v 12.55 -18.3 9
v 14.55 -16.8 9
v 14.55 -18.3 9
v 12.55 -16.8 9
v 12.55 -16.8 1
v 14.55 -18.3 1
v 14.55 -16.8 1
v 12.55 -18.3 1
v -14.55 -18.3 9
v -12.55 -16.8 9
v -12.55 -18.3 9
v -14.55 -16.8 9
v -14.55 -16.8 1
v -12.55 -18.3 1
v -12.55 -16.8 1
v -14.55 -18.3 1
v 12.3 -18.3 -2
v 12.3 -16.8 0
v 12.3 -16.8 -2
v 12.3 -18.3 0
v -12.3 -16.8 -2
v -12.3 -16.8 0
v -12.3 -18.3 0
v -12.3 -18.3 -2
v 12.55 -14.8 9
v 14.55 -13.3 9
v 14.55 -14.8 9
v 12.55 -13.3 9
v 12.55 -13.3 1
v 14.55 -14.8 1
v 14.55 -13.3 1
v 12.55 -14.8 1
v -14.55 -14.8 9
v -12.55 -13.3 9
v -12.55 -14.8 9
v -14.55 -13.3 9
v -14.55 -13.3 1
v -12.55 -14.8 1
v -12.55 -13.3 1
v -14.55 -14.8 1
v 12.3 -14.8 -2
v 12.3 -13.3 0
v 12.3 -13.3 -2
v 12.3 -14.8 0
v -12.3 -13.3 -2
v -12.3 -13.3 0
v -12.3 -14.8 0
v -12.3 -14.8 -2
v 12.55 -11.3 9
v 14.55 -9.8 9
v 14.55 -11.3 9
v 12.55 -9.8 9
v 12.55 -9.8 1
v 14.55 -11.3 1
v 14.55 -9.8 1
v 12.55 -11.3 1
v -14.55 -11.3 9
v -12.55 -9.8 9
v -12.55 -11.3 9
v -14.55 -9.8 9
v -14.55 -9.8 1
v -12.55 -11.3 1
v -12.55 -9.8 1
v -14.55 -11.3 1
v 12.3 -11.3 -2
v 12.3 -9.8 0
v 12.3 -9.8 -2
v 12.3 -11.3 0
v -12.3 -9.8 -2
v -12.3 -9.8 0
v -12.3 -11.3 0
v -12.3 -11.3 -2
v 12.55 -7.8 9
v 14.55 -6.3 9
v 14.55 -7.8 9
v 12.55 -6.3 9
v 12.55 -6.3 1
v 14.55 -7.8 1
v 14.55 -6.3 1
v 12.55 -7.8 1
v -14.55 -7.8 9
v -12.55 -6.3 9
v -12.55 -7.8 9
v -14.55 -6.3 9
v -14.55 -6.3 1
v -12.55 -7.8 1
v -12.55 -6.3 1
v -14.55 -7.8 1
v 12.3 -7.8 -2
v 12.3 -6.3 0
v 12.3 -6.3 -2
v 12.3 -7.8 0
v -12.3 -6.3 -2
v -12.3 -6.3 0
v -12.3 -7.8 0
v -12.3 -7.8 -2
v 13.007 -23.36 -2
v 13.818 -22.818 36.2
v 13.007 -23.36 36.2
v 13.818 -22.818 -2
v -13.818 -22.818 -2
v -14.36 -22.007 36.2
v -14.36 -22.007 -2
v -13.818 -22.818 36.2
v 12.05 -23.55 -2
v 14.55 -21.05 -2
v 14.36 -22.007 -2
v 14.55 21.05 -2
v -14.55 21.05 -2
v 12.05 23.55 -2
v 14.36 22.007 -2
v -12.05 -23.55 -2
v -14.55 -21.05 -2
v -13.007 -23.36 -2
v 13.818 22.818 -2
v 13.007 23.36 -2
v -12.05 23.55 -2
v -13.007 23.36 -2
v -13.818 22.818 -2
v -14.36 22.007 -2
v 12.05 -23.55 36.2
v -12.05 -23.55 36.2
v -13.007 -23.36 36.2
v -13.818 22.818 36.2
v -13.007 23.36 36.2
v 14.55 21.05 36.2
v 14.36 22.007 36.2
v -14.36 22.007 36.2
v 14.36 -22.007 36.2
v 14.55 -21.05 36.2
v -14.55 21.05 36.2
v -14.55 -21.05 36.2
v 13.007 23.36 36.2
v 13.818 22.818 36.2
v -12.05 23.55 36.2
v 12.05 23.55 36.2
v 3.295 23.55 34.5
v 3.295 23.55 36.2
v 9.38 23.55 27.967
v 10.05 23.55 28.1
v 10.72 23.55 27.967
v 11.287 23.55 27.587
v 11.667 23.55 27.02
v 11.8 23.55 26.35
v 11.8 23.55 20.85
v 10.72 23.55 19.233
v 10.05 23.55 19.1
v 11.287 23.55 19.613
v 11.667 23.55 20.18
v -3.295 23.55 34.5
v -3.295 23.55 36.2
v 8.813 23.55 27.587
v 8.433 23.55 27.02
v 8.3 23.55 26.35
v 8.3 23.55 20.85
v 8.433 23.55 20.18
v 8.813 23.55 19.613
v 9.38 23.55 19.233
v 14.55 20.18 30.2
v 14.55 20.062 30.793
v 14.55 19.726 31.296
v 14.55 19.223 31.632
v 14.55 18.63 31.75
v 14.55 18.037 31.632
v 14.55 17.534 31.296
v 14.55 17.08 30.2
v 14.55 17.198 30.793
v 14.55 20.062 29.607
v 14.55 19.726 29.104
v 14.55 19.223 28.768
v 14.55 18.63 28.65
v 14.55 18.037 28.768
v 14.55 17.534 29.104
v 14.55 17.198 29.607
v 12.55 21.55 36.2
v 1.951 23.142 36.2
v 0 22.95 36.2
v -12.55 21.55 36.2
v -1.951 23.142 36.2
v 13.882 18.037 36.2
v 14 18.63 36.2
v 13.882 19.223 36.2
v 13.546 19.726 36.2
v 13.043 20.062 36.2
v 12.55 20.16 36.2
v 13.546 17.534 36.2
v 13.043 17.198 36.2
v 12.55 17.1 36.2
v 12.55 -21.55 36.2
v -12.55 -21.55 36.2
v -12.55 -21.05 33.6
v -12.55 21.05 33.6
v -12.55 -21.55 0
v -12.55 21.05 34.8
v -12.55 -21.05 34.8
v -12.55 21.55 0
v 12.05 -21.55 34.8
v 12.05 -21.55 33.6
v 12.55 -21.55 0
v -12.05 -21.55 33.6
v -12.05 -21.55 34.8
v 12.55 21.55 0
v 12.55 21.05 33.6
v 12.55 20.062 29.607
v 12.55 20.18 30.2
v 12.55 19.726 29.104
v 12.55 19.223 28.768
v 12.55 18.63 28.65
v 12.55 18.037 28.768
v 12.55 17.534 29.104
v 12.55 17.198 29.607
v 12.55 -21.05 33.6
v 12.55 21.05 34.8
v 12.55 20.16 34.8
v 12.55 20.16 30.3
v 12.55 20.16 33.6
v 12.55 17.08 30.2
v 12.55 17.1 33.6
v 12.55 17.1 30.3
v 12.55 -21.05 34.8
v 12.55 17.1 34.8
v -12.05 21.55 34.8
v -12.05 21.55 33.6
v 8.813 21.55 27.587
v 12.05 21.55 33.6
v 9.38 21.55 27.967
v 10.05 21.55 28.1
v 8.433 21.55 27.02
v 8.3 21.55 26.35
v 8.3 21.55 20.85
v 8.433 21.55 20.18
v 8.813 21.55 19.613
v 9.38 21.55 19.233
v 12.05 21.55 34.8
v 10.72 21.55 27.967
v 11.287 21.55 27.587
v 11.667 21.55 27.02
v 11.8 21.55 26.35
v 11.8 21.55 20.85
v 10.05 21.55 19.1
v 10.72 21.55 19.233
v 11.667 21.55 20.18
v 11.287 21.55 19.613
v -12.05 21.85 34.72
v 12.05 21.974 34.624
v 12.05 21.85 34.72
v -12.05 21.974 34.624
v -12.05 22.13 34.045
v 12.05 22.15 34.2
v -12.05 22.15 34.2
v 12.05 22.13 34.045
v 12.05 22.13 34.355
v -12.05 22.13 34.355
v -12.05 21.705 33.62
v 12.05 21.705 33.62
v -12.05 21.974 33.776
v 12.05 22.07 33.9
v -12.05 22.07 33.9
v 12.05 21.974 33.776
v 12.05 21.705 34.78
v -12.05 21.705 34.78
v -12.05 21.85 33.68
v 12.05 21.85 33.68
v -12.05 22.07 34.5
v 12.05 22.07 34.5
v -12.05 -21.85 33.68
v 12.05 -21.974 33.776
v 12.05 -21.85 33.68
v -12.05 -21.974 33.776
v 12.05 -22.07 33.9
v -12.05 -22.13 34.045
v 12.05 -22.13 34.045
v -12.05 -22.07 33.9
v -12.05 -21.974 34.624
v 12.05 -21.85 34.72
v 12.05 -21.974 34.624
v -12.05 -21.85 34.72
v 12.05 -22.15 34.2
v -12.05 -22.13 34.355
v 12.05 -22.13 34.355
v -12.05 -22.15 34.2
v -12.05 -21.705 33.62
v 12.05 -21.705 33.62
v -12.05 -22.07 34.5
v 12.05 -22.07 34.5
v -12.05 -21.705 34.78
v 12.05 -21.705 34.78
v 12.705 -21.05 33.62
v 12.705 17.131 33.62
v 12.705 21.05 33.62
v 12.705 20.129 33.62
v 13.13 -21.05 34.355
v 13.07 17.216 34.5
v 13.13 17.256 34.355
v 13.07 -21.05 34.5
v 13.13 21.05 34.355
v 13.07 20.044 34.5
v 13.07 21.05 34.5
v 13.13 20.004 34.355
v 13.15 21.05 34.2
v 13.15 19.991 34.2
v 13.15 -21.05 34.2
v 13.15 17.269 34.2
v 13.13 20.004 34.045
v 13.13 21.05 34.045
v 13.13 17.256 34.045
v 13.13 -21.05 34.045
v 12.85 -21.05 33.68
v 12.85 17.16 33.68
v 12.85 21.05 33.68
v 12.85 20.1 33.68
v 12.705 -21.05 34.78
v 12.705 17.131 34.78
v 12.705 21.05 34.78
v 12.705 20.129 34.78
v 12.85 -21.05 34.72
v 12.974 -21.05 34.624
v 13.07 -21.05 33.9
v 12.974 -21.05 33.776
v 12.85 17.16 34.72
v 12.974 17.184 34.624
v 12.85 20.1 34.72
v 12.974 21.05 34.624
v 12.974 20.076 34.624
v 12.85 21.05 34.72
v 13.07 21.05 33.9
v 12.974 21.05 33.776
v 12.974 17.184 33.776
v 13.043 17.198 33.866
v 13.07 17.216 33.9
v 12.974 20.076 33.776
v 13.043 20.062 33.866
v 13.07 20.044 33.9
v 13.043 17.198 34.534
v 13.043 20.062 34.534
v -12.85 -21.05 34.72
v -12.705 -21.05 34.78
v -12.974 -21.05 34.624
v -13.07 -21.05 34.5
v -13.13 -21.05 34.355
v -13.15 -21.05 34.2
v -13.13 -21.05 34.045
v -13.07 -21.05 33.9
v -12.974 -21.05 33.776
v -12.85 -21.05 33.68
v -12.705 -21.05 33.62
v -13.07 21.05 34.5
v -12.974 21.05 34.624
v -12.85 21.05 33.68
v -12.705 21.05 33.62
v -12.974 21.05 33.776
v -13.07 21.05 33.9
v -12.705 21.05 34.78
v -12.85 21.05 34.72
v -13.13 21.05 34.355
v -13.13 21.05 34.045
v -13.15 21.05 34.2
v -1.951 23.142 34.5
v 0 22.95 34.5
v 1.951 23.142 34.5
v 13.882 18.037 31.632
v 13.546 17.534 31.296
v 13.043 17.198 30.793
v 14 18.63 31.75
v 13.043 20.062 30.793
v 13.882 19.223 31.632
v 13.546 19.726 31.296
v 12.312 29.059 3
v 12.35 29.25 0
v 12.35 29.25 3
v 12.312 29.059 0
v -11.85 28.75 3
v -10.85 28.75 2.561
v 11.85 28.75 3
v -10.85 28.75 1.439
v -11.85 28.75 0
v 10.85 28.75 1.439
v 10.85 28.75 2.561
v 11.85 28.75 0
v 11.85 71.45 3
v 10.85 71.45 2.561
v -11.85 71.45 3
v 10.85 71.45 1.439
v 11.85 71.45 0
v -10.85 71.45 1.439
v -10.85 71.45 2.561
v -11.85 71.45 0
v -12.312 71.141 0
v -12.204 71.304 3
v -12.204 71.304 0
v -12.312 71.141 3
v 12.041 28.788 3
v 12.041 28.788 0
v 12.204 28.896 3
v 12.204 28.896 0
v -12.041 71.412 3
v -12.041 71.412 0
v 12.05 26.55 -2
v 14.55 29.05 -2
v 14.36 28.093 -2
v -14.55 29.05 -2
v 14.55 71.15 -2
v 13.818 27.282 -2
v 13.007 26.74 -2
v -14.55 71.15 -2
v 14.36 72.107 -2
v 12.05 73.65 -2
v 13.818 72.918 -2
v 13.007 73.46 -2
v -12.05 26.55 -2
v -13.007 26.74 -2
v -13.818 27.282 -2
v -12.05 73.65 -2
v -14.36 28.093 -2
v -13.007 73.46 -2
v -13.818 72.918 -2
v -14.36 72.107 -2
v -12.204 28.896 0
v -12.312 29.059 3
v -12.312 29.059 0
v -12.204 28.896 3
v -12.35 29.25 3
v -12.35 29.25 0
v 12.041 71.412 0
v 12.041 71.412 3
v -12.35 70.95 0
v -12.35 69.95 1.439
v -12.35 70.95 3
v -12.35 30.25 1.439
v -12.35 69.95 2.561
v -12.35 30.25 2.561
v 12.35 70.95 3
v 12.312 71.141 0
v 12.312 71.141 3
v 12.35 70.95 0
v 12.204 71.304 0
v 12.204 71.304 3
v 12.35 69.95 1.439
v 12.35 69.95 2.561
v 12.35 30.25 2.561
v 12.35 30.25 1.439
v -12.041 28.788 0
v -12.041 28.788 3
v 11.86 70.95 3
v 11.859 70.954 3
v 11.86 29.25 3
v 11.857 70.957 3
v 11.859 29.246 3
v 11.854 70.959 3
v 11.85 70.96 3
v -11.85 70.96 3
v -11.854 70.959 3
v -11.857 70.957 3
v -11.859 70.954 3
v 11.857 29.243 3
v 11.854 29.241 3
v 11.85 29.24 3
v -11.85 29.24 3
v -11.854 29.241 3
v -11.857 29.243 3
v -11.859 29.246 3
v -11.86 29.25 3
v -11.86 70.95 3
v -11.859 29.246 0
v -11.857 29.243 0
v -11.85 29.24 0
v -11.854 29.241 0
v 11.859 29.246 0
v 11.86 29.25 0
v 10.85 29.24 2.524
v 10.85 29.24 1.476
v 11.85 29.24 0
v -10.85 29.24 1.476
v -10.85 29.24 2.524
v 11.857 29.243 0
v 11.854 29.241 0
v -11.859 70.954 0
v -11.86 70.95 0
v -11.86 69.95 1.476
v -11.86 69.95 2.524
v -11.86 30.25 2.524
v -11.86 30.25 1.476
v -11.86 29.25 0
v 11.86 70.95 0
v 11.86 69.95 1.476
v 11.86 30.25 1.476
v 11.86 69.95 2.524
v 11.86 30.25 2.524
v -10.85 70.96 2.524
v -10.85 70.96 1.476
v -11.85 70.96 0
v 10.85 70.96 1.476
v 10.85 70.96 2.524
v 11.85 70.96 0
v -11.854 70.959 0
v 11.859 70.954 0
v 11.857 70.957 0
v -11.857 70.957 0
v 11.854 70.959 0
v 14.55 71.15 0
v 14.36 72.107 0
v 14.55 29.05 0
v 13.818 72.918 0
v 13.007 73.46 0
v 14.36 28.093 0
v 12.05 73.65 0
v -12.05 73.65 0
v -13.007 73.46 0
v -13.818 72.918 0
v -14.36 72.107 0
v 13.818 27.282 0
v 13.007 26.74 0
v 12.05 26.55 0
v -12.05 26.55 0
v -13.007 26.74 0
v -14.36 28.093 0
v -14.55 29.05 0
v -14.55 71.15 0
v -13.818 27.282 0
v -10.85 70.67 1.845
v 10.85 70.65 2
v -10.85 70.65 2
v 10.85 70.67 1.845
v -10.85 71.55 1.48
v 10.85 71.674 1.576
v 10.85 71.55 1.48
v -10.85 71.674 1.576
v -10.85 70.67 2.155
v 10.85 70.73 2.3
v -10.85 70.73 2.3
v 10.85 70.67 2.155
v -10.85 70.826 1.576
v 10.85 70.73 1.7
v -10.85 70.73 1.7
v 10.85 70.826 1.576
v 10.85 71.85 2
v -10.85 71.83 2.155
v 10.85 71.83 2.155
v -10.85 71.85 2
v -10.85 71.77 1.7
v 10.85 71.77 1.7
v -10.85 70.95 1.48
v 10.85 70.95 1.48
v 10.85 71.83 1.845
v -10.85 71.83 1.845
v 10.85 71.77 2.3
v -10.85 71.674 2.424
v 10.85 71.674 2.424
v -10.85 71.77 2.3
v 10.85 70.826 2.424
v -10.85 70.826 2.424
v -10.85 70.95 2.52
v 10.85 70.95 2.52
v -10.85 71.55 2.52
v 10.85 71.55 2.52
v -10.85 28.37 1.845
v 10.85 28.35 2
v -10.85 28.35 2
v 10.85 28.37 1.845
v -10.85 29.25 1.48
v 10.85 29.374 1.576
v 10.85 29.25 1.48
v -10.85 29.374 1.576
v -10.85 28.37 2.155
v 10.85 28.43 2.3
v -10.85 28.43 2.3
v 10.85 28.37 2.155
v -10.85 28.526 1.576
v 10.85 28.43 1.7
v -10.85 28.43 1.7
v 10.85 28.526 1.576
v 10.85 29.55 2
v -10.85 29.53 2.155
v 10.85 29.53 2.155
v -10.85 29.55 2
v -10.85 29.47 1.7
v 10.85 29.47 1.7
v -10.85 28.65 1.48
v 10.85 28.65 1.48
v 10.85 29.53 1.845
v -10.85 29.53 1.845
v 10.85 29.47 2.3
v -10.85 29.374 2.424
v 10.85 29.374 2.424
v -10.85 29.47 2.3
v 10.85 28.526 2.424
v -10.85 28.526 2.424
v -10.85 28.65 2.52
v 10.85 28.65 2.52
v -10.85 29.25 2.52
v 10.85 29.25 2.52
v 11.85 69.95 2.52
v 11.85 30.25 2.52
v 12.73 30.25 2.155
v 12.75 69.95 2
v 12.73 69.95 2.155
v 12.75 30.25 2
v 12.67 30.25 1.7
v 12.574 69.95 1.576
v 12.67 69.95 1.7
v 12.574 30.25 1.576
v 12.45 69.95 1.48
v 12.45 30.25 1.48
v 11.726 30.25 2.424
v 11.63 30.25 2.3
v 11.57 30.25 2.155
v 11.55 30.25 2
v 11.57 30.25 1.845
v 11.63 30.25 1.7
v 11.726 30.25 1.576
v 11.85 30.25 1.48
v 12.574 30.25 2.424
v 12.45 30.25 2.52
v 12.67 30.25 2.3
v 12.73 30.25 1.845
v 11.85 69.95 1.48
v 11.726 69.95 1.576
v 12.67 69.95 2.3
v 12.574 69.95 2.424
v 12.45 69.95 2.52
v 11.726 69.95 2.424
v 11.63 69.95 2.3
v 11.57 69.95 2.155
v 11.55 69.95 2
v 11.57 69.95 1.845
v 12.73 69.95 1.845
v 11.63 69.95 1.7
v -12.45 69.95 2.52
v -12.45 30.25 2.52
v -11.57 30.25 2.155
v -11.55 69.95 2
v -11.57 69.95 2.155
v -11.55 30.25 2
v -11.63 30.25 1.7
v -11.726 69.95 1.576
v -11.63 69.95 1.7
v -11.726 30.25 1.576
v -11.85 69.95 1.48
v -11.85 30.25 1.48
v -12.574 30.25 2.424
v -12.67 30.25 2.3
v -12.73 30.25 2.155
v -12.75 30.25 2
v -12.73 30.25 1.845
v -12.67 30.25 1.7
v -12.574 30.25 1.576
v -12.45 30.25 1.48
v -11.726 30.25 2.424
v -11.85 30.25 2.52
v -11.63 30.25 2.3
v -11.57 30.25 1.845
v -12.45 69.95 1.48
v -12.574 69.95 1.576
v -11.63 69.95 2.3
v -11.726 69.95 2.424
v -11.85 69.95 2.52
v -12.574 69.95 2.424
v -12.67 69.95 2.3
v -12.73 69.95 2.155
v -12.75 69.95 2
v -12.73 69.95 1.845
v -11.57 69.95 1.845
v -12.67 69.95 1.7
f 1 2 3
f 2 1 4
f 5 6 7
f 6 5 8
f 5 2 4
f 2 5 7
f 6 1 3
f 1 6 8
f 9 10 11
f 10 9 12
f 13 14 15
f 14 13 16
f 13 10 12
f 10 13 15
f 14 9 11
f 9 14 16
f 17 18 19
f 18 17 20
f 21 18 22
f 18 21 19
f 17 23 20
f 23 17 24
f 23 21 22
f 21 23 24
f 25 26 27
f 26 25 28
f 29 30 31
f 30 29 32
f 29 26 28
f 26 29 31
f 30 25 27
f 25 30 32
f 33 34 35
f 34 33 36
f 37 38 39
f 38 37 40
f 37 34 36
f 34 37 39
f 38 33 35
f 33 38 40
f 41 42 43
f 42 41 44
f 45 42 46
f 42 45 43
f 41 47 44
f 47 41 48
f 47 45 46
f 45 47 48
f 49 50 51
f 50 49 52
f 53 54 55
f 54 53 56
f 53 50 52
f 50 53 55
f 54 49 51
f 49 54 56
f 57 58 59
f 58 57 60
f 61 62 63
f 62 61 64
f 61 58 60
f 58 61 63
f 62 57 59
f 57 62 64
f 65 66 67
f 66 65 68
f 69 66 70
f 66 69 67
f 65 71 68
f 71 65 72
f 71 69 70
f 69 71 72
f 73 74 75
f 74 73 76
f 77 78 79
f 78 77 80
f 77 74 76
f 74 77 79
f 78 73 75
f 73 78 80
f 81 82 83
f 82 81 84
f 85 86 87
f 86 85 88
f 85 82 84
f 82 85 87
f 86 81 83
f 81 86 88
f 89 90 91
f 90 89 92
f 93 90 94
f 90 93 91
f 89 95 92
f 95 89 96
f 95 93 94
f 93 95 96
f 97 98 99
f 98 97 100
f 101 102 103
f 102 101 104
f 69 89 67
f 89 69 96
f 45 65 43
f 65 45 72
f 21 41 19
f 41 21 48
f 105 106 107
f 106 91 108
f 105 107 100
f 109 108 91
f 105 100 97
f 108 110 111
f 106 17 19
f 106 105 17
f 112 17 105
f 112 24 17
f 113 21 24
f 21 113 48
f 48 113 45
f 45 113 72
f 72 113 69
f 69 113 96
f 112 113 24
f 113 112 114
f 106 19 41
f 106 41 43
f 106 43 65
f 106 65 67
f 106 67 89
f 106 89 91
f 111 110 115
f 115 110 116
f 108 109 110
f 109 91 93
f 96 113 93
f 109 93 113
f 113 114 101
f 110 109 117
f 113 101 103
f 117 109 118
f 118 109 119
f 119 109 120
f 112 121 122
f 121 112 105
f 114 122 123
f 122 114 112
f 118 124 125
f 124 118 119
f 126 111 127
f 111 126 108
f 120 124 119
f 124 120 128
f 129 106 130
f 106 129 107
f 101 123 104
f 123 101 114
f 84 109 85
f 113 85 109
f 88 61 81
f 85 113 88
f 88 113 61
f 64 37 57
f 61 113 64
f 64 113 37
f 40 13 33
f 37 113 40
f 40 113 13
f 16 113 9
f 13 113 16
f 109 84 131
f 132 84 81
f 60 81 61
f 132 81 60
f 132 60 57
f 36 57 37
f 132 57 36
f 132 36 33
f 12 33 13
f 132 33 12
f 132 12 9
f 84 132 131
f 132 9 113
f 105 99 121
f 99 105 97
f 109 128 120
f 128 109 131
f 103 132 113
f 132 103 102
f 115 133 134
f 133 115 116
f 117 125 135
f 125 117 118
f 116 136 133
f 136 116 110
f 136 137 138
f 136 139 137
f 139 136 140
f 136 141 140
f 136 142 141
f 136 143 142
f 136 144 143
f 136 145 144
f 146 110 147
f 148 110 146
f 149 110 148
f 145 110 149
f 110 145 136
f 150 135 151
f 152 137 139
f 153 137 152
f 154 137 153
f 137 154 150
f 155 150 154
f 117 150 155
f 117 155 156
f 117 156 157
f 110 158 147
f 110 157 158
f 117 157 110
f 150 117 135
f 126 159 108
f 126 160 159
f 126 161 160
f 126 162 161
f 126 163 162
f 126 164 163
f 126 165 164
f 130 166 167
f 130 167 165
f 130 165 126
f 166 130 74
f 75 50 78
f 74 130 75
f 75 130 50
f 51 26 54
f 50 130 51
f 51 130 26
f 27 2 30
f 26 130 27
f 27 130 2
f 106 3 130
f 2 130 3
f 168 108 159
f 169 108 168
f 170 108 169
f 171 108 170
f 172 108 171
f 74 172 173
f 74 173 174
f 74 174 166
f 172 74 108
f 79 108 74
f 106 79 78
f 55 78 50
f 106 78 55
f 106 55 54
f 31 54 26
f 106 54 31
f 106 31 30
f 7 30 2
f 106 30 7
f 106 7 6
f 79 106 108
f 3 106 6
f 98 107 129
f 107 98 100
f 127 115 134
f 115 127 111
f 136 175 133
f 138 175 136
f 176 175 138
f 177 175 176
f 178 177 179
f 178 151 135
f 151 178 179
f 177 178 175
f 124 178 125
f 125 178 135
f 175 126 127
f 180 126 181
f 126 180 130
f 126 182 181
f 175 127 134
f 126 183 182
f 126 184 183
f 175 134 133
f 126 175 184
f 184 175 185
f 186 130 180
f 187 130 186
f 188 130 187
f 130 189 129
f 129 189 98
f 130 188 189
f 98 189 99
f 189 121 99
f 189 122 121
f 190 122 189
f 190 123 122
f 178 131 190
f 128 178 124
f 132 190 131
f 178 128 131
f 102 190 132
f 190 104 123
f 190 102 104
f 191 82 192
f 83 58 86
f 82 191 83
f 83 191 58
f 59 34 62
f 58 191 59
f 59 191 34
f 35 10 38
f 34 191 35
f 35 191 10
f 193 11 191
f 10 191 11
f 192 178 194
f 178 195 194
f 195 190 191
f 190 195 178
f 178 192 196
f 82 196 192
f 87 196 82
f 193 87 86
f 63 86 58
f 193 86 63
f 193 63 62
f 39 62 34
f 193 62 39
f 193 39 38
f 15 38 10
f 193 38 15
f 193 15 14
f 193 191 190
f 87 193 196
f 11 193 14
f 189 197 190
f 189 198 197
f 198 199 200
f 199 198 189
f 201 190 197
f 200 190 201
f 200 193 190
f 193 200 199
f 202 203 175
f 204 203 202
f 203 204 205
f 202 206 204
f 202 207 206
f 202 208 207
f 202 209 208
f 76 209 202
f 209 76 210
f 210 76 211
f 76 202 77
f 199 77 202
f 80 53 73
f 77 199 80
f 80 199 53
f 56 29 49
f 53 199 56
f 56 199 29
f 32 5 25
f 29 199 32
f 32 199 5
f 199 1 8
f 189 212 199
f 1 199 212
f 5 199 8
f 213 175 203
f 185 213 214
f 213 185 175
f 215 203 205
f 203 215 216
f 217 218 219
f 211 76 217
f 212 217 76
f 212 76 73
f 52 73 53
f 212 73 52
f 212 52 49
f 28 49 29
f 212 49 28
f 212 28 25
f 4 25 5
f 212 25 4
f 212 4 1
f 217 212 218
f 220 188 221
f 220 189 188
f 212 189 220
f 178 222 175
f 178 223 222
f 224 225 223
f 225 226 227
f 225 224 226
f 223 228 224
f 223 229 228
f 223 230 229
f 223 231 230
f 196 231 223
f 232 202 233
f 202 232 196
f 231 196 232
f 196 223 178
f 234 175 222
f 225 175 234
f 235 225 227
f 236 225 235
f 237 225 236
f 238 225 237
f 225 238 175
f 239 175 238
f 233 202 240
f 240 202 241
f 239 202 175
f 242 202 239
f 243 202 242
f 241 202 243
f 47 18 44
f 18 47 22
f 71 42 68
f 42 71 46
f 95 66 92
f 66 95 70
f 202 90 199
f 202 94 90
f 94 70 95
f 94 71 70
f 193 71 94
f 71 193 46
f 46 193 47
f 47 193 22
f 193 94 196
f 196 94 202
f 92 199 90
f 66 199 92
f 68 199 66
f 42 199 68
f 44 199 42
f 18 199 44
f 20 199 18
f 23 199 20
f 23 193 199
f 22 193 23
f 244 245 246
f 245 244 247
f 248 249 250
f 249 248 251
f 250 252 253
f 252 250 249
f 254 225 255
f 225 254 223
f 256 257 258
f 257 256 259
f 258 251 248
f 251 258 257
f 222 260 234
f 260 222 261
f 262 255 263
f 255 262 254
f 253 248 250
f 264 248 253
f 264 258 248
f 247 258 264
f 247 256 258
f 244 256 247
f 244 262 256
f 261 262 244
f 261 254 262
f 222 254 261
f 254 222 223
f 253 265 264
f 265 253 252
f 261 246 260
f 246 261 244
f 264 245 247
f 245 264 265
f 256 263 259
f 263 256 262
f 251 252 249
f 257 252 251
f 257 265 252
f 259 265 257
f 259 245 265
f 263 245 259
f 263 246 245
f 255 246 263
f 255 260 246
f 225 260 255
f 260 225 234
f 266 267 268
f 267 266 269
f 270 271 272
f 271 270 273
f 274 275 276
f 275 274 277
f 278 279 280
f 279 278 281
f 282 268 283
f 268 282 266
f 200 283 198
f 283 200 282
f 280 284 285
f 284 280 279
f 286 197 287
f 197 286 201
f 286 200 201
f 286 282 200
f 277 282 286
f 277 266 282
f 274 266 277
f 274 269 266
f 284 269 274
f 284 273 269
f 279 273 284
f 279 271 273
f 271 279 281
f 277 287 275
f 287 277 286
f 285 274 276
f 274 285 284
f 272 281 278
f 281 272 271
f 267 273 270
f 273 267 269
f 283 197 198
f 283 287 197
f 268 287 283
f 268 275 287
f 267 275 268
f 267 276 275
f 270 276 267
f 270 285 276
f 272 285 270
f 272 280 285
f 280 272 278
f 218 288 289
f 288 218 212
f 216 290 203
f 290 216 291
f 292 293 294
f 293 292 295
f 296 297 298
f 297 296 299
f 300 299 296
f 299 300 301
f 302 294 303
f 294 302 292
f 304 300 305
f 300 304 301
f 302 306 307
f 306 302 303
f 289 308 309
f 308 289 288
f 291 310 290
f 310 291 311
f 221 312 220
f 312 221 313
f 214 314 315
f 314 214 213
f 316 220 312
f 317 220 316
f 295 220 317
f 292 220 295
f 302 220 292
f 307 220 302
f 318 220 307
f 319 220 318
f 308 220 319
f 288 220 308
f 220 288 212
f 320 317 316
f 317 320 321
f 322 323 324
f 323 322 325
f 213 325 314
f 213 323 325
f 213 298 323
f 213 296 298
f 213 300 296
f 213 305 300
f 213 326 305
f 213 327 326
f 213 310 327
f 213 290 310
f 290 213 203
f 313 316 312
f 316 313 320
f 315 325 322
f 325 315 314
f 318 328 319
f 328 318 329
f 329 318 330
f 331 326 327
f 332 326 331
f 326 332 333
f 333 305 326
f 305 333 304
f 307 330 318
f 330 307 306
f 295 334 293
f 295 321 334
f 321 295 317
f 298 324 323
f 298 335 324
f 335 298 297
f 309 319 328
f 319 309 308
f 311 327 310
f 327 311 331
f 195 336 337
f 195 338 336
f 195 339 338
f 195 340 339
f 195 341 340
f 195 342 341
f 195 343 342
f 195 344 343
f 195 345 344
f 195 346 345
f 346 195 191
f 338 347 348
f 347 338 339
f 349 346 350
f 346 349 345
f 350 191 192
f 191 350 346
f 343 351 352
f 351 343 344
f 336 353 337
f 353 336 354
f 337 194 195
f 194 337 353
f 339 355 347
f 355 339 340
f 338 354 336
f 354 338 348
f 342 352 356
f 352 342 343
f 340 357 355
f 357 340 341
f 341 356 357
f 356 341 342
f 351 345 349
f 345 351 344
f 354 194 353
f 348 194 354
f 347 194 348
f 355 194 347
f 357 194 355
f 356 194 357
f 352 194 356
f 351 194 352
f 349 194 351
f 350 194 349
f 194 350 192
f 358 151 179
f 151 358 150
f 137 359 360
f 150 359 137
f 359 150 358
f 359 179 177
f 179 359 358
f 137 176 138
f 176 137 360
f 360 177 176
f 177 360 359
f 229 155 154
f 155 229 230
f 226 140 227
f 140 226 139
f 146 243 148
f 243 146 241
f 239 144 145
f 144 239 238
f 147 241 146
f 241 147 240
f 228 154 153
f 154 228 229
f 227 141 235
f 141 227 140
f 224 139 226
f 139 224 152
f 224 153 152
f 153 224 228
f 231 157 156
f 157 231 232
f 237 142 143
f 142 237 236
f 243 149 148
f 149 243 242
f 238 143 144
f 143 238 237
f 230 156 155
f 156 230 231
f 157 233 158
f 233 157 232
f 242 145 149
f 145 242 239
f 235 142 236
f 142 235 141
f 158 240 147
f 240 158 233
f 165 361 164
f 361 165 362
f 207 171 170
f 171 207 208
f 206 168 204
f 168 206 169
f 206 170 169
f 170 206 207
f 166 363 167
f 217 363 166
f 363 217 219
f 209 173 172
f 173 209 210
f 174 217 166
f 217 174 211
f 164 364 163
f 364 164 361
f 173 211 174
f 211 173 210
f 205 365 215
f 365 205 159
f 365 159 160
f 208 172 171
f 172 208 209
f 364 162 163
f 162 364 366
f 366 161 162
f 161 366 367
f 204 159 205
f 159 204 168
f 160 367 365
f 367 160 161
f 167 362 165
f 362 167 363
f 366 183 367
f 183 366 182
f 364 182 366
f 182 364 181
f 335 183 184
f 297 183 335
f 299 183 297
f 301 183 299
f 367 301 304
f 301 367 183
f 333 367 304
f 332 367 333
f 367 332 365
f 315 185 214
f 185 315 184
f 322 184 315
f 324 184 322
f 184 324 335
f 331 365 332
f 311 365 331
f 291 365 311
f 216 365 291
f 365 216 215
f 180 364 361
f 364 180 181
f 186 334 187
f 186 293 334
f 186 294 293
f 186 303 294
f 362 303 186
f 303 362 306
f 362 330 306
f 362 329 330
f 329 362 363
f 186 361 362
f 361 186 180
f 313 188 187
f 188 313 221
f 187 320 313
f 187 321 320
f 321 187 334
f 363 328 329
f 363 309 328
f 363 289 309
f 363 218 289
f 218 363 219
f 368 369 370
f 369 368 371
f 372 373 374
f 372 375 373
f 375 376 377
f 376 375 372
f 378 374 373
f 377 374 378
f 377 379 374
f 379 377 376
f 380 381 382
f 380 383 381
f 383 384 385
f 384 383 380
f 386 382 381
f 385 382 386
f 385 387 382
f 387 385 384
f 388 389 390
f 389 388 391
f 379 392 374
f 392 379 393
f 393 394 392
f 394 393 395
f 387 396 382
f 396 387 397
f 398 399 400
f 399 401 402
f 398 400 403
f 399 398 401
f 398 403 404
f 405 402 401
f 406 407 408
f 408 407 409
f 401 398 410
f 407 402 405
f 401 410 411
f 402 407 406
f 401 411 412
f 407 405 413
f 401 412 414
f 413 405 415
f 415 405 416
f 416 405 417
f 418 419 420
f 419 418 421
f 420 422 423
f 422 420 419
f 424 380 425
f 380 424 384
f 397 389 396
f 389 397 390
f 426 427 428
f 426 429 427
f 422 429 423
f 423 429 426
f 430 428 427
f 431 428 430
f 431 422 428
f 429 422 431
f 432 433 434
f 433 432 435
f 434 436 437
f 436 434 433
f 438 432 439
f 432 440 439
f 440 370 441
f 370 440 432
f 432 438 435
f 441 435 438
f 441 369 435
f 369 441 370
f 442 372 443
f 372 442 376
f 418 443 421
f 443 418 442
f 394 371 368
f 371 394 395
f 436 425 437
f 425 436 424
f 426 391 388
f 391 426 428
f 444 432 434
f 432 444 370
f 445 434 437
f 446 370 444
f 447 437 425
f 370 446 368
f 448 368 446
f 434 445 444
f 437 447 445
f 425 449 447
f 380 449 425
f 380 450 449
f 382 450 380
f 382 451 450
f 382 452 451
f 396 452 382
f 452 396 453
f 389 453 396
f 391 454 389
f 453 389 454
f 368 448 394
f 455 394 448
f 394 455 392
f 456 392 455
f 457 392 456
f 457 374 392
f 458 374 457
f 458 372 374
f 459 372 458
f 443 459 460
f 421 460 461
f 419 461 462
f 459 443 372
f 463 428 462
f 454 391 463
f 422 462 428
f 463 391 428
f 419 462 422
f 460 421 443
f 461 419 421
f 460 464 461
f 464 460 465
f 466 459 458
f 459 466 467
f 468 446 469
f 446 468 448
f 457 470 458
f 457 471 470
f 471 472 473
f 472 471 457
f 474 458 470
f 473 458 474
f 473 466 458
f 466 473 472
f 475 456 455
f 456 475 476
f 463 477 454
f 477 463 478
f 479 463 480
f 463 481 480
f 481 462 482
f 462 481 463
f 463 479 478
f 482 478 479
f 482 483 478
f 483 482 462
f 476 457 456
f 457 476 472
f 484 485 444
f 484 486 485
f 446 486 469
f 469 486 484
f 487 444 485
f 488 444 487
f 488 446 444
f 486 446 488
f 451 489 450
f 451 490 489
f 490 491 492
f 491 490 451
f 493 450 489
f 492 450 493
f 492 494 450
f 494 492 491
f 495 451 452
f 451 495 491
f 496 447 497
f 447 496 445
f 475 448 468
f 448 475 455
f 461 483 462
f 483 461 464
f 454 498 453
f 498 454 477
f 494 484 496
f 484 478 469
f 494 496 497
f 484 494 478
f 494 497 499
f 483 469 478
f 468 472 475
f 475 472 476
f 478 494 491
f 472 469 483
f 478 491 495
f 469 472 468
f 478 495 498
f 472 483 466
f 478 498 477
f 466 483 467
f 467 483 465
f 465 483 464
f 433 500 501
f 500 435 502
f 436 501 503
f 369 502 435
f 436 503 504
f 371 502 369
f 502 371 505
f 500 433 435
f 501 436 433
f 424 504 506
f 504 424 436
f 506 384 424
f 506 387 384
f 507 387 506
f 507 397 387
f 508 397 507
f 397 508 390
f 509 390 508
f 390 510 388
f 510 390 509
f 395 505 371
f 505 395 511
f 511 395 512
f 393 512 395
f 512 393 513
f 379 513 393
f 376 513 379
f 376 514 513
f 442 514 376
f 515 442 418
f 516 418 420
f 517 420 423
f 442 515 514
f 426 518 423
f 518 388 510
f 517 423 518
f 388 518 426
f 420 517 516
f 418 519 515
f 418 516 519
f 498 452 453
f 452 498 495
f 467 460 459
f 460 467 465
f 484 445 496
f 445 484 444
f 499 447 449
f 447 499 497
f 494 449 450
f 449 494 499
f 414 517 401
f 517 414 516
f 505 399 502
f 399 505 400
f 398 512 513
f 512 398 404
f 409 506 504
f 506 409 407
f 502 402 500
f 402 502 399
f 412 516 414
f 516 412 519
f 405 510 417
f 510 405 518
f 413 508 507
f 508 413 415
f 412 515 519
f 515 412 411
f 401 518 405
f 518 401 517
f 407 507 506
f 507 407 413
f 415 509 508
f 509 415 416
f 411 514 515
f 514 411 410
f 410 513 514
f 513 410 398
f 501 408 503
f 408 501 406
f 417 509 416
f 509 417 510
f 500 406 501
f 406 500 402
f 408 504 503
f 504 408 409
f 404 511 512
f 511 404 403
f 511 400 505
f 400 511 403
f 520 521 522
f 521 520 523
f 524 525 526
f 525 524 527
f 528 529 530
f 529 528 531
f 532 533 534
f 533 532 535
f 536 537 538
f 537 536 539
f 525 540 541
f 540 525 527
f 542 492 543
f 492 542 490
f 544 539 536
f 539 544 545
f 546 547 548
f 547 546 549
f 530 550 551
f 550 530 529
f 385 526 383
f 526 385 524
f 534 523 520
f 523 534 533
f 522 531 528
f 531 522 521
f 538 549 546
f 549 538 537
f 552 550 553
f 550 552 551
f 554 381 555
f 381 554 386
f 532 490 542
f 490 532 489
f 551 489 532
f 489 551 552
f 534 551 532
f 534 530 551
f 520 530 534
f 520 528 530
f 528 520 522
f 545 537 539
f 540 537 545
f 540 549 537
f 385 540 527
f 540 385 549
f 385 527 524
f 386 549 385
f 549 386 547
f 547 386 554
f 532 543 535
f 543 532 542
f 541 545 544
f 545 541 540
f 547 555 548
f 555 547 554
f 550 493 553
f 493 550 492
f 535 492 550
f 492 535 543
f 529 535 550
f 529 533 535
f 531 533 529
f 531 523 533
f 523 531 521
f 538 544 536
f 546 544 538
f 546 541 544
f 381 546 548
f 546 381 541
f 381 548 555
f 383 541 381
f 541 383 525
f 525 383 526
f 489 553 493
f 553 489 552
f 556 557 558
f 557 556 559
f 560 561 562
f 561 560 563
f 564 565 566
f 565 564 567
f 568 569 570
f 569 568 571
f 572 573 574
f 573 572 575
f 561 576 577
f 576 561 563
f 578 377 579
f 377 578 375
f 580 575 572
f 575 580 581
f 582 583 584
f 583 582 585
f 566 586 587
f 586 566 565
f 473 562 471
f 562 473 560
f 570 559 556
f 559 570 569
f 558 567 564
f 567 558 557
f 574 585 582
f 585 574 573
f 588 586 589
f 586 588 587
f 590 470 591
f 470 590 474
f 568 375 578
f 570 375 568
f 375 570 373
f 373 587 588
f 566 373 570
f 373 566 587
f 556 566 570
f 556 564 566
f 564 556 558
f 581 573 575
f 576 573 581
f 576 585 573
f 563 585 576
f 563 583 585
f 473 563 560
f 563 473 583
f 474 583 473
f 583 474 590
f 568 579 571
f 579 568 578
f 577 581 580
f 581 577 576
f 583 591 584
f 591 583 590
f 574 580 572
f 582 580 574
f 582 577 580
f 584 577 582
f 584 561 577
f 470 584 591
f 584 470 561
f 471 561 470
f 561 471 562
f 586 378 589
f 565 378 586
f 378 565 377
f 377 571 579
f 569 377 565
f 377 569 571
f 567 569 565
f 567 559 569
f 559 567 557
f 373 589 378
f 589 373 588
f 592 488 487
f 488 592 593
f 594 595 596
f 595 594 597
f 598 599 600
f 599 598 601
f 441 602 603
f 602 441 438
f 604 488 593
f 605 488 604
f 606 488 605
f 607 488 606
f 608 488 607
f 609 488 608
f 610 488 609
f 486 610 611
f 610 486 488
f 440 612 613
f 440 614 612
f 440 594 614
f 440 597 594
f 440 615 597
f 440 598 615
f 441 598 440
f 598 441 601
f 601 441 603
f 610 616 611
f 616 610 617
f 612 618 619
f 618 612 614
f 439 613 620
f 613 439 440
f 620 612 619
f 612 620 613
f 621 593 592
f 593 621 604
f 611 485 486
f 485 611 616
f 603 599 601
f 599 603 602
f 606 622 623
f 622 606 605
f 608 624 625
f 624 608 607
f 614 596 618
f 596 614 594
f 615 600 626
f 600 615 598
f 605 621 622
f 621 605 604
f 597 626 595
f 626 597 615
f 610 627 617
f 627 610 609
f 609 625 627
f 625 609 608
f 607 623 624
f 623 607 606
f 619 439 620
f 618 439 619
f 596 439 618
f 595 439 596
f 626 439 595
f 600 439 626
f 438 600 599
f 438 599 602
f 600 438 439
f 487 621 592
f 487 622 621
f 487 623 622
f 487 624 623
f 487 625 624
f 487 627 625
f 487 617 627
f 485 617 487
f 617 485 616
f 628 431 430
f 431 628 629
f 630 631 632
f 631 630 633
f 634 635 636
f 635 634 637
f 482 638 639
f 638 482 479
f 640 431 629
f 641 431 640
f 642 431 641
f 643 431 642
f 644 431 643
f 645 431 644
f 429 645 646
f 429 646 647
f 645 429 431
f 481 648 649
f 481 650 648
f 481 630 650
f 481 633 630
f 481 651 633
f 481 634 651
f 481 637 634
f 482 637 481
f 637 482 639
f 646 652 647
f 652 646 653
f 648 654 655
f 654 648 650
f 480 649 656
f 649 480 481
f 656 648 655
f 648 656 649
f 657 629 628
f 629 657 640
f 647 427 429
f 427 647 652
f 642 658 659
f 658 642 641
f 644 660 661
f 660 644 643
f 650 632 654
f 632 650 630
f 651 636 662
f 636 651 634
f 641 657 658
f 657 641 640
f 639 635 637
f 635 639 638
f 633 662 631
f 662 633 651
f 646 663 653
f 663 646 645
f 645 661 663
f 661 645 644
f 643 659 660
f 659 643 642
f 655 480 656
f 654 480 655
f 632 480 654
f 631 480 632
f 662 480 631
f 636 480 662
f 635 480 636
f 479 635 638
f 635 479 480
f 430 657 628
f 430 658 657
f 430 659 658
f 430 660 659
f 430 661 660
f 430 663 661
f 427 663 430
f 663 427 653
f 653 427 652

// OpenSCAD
// remix of https://www.thingiverse.com/thing:2411898
// (C)Inhumierer June 30, 2017
// my credits for Inhumierer

// V 1.4 changed b to 0.5 after test 3D prints
// V 1.3 adaption to HB_TH_Sensor_SHT45_BME280_FUEL4EP by FUEL4EP 02/2024
// V 1.2 Correction / hint from molotok3D, some minor fixes
// V 1.1- added opening helper and an optional separating wall 

// IMPORTANT: Please adjust the variable 'gap' below to
// get a proper and not too tight fitting of the cover
// and the bottom INNERBOX.
// The necessary adjustment may depend on your 3D
// printer's tolerances.
//

// put a # in front of a command in order to identify the concerning created object

$fn=40;

wINNERBOX=24.6;
lINNERBOX=42.6;
b=0.5;            // border distance innner wall to INNERBOX

wi=wINNERBOX+b;	  // inner width, length & heigth
li=lINNERBOX+b;
th=2;	// wall thickness
h=14.5+18.1+2*th+3.1-3.5;
r=0.5;	// radius of rounded corners
opening_help=true;	// make a gap to ease opening of the cover, f.ex.
		// with a coin - girls are afraid of their finger nails ;-)
e=0.01;
ri=(r>th)?r-th:e;	// needed for the cover - needs to be larger than 0 for proper results
l=li-2*r;
w=wi-2*r;
delta=0.001;


th_INNERBOX=0.8;               // INNERBOX thickness

show_INNERBOX=false;           // set to true for checking purpose

// venting slits for sensor

n_slits=2;
h_slits=8;
zo_slits=1;
y_center_slits=-lINNERBOX/2+10;
w_slits=1.5;
inc_slits=3.5;

d_usb_c=3.5;
w_usb_c=9-d_usb_c;
zo_usb_c=5.0-3.5+1.5;
xo_usb_c=0.4+0.1;

d_LED=3.1;
yo_LED=2.7+2.54/2;
zo_LED=2.4-3.5+1.5+0.5;


module OuterCase(){
	difference(){
		translate([0,0,-th])hull(){
			for (i=[[-w/2,-l/2],[-w/2,l/2],[w/2,-l/2],[w/2,l/2]]){
				translate(i)cylinder(r=r+th,h=h+th,$fn=32*r);
			}
		}
		hull(){
			for (i=[[-w/2,-l/2],[-w/2,l/2,],[w/2,-l/2],[w/2,l/2]]){
				translate(i)cylinder(r=r,h=h+delta,$fn=32*r);
			}
  }
  #translate([-w/2-r,-l/2-r,0]) cube([wi,li,h]);
		translate([-w/2,l/2+r,h-2])rotate([0,90,0])cylinder(d=1.2,h=w,$fn=24);
		translate([-w/2,-l/2-r,h-2])rotate([0,90,0])cylinder(d=1.2,h=w,$fn=24);
		translate([w/2+r,l/2,h-2])rotate([90,0,0])cylinder(d=1.2,h=l,$fn=24);
		translate([-w/2-r,l/2,h-2])rotate([90,0,0])cylinder(d=1.2,h=l,$fn=24);
  
  

		// if you need some adjustment for the opening helper size or position,
		// this is the right place
		if (opening_help)translate([0,l/2+11.9,h-1.7])cylinder(d=20,h=1.7,$fn=32);

// venilation slits 
     
        for ( i=[-n_slits:1:n_slits-1] ){   
          translate([wi/2-delta,i*inc_slits+y_center_slits,zo_slits])
            cube([th+2*delta,w_slits,h_slits]);
          translate([-wi/2-delta-th,i*inc_slits+y_center_slits,zo_slits])
            cube([th+2*delta,w_slits,h_slits]);
          translate([wINNERBOX/2-2*h_slits,i*inc_slits+y_center_slits,-th-delta])
            cube([2*h_slits,w_slits,th+2*delta]);      
          translate([-wINNERBOX/2,i*inc_slits+y_center_slits,-th-delta])
            cube([2*h_slits,w_slits,th+2*delta]);
  }
  
// USB C opening
  
  translate([wi/2-th-xo_usb_c,+li/2+th,h-w_usb_c-d_usb_c/2-zo_usb_c-th-3.1]) rotate([90,0,0]) hull() {
      cylinder(r=d_usb_c/2,h=th,$fn=32*r);
      translate([0,w_usb_c,0]) cylinder(r=d_usb_c/2,h=th,$fn=32*r);
    }
      
      
// charging LED opening
   
  translate([w/2+r,l/2+d_LED/2-yo_LED,h-zo_LED-th-3.1]) rotate([0,90,0]) cylinder(r=d_LED/2,h=th,$fn=32*r);
  translate([-0.1+w/2+r,l/2+d_LED/2-yo_LED,h-zo_LED-th-3.1]) rotate([0,0,0]) cylinder(r=d_LED/2,h=7.5-2.0+0.5,$fn=32*r);       
    
	}

}  

module cover(){
    
gap=0.2;  // added FUEL4EP after test print, cover was too tight wiithout additional gap
    
	translate([0,0,-th])hull(){
		for (i=[[-w/2,-l/2],[-w/2,l/2],[w/2,-l/2],[w/2,l/2]]){
			translate(i)cylinder(r=r+th,h=th,$fn=32*r);
		}
	}
	difference(){
		translate([0,0,-th])hull(){
			for (i=[[-w/2+gap,-l/2+gap],[-w/2+gap,l/2-gap],[w/2-gap,-l/2+gap],[w/2-gap,l/2-gap]]){
				translate(i)cylinder(r=r,h=th+3,$fn=32*r);
			}
		}
		hull(){
			for (i=[[-w/2+gap,-l/2+gap],[-w/2+gap,l/2-gap],[w/2-gap,-l/2+gap],[w/2-gap,l/2-gap]]){
				if (r>th){
					translate(i)cylinder(r=r-th,h=3,$fn=32*r);
				}else{
					translate(i)cylinder(r=e,h=3,$fn=32*r);
				}
			}
		}
	} 
	translate([-w/2+1+gap,l/2-gap+r-0.2,2])rotate([0,90,0])cylinder(d=1.2,h=w-2-2*gap,$fn=24);
	translate([-w/2+1+gap,-l/2+gap-r+0.2,2])rotate([0,90,0])cylinder(d=1.2,h=w-2-2*gap,$fn=24);
	translate([w/2-gap+r-0.2,l/2-1-gap,2])rotate([90,0,0])cylinder(d=1.2,h=l-2-2*gap,$fn=24);
	translate([-w/2+gap-r+0.2,l/2-1-gap,2])rotate([90,0,0])cylinder(d=1.2,h=l-2-2*gap,$fn=24);
}

// outer case
OuterCase();

// cover
translate([0,li+3+2*th,0]) cover();

// outer dimenions
echo("width = ",wi+2*th);
echo("length = ",li+2*th);
echo("height = ",h+2*th);

// inner opening dimenions
echo("inner width = ",wi);
echo("inner length = ",li);
echo("inner height = ",h);
